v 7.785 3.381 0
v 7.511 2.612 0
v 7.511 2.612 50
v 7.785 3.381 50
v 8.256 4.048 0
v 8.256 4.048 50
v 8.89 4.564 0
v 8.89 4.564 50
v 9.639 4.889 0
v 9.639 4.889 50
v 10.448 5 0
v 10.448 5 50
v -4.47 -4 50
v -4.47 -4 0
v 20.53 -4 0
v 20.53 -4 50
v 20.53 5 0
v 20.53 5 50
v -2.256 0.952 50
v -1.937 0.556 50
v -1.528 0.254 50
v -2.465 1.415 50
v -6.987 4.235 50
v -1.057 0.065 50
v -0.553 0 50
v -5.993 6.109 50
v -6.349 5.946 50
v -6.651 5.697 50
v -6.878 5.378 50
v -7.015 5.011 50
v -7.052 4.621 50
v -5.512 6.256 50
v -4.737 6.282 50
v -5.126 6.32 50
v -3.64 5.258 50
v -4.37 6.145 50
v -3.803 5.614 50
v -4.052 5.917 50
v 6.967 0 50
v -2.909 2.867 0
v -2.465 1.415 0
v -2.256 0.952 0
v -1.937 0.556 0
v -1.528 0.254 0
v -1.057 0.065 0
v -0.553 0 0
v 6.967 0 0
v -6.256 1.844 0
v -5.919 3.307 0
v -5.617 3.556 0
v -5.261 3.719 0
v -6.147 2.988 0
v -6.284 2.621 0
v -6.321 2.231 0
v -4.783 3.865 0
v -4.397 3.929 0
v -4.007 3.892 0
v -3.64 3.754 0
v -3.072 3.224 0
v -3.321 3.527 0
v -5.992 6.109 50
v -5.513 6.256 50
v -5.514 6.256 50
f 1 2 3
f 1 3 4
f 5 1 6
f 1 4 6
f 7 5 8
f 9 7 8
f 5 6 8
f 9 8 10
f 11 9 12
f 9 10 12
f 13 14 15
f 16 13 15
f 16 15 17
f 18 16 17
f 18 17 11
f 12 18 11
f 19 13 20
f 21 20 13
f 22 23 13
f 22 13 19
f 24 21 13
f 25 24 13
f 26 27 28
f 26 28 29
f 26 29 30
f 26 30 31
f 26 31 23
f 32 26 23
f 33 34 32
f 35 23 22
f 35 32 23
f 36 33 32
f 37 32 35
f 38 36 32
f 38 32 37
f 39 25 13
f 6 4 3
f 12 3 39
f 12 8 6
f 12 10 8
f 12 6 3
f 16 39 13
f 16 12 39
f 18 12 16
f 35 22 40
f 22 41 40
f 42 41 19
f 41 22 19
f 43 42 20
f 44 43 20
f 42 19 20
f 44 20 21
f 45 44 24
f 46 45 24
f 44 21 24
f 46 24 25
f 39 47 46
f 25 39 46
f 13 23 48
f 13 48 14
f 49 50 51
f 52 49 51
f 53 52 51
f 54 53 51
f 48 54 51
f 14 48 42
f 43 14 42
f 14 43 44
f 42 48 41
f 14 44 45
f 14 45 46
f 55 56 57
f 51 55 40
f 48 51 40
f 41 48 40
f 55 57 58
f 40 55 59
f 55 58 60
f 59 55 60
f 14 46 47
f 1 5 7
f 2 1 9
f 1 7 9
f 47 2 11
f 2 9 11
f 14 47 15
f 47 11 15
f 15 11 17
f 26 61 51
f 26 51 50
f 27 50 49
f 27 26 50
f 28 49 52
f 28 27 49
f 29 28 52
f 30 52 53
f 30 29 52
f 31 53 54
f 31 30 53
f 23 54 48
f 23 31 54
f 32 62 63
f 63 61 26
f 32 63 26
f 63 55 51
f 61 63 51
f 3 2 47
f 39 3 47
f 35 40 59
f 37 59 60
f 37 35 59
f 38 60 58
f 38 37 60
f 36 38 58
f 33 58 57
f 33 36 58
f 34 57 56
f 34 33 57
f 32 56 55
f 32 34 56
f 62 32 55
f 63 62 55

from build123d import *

# Parameters (mm, degrees)
F1_DEPTH    = 50
F2_SIZE2    = 2.49999
F2_SIZE     = 49.99999
F3_T1_DEPTH = 57.5624504994
F4_R        = 2
F5_R        = 3


# Not quite as in the source:
# - a fillet or chamfer that OpenCascade refuses, or shapes differently, is made with other operations: its cross-section is extruded or revolved along the edge and cut away or added
# - a fillet or chamfer is up to 0.001 mm smaller than in the source, because OpenCascade refuses the exact size


with BuildPart() as f1:
    # F0 (on Top) → F1 (new body)
    with BuildSketch(Plane.XY):
        Polygon((-4.0792049388, 6.6941332917), (-7.4262715846, 5.6708323252), (-4.4696014276, -4), (20.5303985724, -4), (20.5303985724, 5), (8.0088521886, 5), (6.9673969943, 0), (-2.0326030057, 0), align=None)
    extrude(amount=F1_DEPTH)

    # F2 (size 50 and 2.5 in the source; OpenCascade refuses exactly that, so slightly less here)
    f2_edges = [f1.edges().sort_by_distance(p)[0] for p in [
        (-5.752738, 6.182483, 0),
    ]]
    f2_side = f1.faces().sort_by_distance((-5.752738, 6.182483, 25))[0]
    chamfer(f2_edges, length=F2_SIZE, length2=F2_SIZE2, reference=f2_side)

    # F3: fillet of radius 1.5 on 2 edges, made by hand

    # F3_s2 → F3_t1 (cut)
    with BuildSketch(Plane(origin=(-0.7893916774, 2.5819838349, 53.9993894282), x_dir=(0.956304756, 0.2923717047, 0), z_dir=(0.0146002909, -0.0477553996, -0.9987523483))):
        with BuildLine():
            ThreePointArc((-1.9437879213, -3.5879297119), (-2.3831277496, -4.6485898837), (-3.4437879213, -5.0879297119))
            Line((-3.4437879213, -5.0879297119), (-1.9437879213, -5.0879297119))
            Line((-1.9437879213, -5.0879297119), (-1.9437879213, -3.5879297119))
        make_face()
        with BuildLine():
            ThreePointArc((-3.9437879213, -5.0879297119), (-5.0044480931, -4.6485898837), (-5.4437879213, -3.5879297119))
            Line((-5.4437879213, -3.5879297119), (-5.4437879213, -5.0879297119))
            Line((-5.4437879213, -5.0879297119), (-3.9437879213, -5.0879297119))
        make_face()
    extrude(amount=F3_T1_DEPTH, mode=Mode.SUBTRACT)

    # F4
    f4_edges = [f1.edges().sort_by_distance(p)[0] for p in [
        (-2.032603, 0, 25),
    ]]
    fillet(f4_edges, radius=F4_R)

    # F5
    f5_edges = [f1.edges().sort_by_distance(p)[0] for p in [
        (8.008852, 5, 25),
    ]]
    fillet(f5_edges, radius=F5_R)


solid = f1.part
